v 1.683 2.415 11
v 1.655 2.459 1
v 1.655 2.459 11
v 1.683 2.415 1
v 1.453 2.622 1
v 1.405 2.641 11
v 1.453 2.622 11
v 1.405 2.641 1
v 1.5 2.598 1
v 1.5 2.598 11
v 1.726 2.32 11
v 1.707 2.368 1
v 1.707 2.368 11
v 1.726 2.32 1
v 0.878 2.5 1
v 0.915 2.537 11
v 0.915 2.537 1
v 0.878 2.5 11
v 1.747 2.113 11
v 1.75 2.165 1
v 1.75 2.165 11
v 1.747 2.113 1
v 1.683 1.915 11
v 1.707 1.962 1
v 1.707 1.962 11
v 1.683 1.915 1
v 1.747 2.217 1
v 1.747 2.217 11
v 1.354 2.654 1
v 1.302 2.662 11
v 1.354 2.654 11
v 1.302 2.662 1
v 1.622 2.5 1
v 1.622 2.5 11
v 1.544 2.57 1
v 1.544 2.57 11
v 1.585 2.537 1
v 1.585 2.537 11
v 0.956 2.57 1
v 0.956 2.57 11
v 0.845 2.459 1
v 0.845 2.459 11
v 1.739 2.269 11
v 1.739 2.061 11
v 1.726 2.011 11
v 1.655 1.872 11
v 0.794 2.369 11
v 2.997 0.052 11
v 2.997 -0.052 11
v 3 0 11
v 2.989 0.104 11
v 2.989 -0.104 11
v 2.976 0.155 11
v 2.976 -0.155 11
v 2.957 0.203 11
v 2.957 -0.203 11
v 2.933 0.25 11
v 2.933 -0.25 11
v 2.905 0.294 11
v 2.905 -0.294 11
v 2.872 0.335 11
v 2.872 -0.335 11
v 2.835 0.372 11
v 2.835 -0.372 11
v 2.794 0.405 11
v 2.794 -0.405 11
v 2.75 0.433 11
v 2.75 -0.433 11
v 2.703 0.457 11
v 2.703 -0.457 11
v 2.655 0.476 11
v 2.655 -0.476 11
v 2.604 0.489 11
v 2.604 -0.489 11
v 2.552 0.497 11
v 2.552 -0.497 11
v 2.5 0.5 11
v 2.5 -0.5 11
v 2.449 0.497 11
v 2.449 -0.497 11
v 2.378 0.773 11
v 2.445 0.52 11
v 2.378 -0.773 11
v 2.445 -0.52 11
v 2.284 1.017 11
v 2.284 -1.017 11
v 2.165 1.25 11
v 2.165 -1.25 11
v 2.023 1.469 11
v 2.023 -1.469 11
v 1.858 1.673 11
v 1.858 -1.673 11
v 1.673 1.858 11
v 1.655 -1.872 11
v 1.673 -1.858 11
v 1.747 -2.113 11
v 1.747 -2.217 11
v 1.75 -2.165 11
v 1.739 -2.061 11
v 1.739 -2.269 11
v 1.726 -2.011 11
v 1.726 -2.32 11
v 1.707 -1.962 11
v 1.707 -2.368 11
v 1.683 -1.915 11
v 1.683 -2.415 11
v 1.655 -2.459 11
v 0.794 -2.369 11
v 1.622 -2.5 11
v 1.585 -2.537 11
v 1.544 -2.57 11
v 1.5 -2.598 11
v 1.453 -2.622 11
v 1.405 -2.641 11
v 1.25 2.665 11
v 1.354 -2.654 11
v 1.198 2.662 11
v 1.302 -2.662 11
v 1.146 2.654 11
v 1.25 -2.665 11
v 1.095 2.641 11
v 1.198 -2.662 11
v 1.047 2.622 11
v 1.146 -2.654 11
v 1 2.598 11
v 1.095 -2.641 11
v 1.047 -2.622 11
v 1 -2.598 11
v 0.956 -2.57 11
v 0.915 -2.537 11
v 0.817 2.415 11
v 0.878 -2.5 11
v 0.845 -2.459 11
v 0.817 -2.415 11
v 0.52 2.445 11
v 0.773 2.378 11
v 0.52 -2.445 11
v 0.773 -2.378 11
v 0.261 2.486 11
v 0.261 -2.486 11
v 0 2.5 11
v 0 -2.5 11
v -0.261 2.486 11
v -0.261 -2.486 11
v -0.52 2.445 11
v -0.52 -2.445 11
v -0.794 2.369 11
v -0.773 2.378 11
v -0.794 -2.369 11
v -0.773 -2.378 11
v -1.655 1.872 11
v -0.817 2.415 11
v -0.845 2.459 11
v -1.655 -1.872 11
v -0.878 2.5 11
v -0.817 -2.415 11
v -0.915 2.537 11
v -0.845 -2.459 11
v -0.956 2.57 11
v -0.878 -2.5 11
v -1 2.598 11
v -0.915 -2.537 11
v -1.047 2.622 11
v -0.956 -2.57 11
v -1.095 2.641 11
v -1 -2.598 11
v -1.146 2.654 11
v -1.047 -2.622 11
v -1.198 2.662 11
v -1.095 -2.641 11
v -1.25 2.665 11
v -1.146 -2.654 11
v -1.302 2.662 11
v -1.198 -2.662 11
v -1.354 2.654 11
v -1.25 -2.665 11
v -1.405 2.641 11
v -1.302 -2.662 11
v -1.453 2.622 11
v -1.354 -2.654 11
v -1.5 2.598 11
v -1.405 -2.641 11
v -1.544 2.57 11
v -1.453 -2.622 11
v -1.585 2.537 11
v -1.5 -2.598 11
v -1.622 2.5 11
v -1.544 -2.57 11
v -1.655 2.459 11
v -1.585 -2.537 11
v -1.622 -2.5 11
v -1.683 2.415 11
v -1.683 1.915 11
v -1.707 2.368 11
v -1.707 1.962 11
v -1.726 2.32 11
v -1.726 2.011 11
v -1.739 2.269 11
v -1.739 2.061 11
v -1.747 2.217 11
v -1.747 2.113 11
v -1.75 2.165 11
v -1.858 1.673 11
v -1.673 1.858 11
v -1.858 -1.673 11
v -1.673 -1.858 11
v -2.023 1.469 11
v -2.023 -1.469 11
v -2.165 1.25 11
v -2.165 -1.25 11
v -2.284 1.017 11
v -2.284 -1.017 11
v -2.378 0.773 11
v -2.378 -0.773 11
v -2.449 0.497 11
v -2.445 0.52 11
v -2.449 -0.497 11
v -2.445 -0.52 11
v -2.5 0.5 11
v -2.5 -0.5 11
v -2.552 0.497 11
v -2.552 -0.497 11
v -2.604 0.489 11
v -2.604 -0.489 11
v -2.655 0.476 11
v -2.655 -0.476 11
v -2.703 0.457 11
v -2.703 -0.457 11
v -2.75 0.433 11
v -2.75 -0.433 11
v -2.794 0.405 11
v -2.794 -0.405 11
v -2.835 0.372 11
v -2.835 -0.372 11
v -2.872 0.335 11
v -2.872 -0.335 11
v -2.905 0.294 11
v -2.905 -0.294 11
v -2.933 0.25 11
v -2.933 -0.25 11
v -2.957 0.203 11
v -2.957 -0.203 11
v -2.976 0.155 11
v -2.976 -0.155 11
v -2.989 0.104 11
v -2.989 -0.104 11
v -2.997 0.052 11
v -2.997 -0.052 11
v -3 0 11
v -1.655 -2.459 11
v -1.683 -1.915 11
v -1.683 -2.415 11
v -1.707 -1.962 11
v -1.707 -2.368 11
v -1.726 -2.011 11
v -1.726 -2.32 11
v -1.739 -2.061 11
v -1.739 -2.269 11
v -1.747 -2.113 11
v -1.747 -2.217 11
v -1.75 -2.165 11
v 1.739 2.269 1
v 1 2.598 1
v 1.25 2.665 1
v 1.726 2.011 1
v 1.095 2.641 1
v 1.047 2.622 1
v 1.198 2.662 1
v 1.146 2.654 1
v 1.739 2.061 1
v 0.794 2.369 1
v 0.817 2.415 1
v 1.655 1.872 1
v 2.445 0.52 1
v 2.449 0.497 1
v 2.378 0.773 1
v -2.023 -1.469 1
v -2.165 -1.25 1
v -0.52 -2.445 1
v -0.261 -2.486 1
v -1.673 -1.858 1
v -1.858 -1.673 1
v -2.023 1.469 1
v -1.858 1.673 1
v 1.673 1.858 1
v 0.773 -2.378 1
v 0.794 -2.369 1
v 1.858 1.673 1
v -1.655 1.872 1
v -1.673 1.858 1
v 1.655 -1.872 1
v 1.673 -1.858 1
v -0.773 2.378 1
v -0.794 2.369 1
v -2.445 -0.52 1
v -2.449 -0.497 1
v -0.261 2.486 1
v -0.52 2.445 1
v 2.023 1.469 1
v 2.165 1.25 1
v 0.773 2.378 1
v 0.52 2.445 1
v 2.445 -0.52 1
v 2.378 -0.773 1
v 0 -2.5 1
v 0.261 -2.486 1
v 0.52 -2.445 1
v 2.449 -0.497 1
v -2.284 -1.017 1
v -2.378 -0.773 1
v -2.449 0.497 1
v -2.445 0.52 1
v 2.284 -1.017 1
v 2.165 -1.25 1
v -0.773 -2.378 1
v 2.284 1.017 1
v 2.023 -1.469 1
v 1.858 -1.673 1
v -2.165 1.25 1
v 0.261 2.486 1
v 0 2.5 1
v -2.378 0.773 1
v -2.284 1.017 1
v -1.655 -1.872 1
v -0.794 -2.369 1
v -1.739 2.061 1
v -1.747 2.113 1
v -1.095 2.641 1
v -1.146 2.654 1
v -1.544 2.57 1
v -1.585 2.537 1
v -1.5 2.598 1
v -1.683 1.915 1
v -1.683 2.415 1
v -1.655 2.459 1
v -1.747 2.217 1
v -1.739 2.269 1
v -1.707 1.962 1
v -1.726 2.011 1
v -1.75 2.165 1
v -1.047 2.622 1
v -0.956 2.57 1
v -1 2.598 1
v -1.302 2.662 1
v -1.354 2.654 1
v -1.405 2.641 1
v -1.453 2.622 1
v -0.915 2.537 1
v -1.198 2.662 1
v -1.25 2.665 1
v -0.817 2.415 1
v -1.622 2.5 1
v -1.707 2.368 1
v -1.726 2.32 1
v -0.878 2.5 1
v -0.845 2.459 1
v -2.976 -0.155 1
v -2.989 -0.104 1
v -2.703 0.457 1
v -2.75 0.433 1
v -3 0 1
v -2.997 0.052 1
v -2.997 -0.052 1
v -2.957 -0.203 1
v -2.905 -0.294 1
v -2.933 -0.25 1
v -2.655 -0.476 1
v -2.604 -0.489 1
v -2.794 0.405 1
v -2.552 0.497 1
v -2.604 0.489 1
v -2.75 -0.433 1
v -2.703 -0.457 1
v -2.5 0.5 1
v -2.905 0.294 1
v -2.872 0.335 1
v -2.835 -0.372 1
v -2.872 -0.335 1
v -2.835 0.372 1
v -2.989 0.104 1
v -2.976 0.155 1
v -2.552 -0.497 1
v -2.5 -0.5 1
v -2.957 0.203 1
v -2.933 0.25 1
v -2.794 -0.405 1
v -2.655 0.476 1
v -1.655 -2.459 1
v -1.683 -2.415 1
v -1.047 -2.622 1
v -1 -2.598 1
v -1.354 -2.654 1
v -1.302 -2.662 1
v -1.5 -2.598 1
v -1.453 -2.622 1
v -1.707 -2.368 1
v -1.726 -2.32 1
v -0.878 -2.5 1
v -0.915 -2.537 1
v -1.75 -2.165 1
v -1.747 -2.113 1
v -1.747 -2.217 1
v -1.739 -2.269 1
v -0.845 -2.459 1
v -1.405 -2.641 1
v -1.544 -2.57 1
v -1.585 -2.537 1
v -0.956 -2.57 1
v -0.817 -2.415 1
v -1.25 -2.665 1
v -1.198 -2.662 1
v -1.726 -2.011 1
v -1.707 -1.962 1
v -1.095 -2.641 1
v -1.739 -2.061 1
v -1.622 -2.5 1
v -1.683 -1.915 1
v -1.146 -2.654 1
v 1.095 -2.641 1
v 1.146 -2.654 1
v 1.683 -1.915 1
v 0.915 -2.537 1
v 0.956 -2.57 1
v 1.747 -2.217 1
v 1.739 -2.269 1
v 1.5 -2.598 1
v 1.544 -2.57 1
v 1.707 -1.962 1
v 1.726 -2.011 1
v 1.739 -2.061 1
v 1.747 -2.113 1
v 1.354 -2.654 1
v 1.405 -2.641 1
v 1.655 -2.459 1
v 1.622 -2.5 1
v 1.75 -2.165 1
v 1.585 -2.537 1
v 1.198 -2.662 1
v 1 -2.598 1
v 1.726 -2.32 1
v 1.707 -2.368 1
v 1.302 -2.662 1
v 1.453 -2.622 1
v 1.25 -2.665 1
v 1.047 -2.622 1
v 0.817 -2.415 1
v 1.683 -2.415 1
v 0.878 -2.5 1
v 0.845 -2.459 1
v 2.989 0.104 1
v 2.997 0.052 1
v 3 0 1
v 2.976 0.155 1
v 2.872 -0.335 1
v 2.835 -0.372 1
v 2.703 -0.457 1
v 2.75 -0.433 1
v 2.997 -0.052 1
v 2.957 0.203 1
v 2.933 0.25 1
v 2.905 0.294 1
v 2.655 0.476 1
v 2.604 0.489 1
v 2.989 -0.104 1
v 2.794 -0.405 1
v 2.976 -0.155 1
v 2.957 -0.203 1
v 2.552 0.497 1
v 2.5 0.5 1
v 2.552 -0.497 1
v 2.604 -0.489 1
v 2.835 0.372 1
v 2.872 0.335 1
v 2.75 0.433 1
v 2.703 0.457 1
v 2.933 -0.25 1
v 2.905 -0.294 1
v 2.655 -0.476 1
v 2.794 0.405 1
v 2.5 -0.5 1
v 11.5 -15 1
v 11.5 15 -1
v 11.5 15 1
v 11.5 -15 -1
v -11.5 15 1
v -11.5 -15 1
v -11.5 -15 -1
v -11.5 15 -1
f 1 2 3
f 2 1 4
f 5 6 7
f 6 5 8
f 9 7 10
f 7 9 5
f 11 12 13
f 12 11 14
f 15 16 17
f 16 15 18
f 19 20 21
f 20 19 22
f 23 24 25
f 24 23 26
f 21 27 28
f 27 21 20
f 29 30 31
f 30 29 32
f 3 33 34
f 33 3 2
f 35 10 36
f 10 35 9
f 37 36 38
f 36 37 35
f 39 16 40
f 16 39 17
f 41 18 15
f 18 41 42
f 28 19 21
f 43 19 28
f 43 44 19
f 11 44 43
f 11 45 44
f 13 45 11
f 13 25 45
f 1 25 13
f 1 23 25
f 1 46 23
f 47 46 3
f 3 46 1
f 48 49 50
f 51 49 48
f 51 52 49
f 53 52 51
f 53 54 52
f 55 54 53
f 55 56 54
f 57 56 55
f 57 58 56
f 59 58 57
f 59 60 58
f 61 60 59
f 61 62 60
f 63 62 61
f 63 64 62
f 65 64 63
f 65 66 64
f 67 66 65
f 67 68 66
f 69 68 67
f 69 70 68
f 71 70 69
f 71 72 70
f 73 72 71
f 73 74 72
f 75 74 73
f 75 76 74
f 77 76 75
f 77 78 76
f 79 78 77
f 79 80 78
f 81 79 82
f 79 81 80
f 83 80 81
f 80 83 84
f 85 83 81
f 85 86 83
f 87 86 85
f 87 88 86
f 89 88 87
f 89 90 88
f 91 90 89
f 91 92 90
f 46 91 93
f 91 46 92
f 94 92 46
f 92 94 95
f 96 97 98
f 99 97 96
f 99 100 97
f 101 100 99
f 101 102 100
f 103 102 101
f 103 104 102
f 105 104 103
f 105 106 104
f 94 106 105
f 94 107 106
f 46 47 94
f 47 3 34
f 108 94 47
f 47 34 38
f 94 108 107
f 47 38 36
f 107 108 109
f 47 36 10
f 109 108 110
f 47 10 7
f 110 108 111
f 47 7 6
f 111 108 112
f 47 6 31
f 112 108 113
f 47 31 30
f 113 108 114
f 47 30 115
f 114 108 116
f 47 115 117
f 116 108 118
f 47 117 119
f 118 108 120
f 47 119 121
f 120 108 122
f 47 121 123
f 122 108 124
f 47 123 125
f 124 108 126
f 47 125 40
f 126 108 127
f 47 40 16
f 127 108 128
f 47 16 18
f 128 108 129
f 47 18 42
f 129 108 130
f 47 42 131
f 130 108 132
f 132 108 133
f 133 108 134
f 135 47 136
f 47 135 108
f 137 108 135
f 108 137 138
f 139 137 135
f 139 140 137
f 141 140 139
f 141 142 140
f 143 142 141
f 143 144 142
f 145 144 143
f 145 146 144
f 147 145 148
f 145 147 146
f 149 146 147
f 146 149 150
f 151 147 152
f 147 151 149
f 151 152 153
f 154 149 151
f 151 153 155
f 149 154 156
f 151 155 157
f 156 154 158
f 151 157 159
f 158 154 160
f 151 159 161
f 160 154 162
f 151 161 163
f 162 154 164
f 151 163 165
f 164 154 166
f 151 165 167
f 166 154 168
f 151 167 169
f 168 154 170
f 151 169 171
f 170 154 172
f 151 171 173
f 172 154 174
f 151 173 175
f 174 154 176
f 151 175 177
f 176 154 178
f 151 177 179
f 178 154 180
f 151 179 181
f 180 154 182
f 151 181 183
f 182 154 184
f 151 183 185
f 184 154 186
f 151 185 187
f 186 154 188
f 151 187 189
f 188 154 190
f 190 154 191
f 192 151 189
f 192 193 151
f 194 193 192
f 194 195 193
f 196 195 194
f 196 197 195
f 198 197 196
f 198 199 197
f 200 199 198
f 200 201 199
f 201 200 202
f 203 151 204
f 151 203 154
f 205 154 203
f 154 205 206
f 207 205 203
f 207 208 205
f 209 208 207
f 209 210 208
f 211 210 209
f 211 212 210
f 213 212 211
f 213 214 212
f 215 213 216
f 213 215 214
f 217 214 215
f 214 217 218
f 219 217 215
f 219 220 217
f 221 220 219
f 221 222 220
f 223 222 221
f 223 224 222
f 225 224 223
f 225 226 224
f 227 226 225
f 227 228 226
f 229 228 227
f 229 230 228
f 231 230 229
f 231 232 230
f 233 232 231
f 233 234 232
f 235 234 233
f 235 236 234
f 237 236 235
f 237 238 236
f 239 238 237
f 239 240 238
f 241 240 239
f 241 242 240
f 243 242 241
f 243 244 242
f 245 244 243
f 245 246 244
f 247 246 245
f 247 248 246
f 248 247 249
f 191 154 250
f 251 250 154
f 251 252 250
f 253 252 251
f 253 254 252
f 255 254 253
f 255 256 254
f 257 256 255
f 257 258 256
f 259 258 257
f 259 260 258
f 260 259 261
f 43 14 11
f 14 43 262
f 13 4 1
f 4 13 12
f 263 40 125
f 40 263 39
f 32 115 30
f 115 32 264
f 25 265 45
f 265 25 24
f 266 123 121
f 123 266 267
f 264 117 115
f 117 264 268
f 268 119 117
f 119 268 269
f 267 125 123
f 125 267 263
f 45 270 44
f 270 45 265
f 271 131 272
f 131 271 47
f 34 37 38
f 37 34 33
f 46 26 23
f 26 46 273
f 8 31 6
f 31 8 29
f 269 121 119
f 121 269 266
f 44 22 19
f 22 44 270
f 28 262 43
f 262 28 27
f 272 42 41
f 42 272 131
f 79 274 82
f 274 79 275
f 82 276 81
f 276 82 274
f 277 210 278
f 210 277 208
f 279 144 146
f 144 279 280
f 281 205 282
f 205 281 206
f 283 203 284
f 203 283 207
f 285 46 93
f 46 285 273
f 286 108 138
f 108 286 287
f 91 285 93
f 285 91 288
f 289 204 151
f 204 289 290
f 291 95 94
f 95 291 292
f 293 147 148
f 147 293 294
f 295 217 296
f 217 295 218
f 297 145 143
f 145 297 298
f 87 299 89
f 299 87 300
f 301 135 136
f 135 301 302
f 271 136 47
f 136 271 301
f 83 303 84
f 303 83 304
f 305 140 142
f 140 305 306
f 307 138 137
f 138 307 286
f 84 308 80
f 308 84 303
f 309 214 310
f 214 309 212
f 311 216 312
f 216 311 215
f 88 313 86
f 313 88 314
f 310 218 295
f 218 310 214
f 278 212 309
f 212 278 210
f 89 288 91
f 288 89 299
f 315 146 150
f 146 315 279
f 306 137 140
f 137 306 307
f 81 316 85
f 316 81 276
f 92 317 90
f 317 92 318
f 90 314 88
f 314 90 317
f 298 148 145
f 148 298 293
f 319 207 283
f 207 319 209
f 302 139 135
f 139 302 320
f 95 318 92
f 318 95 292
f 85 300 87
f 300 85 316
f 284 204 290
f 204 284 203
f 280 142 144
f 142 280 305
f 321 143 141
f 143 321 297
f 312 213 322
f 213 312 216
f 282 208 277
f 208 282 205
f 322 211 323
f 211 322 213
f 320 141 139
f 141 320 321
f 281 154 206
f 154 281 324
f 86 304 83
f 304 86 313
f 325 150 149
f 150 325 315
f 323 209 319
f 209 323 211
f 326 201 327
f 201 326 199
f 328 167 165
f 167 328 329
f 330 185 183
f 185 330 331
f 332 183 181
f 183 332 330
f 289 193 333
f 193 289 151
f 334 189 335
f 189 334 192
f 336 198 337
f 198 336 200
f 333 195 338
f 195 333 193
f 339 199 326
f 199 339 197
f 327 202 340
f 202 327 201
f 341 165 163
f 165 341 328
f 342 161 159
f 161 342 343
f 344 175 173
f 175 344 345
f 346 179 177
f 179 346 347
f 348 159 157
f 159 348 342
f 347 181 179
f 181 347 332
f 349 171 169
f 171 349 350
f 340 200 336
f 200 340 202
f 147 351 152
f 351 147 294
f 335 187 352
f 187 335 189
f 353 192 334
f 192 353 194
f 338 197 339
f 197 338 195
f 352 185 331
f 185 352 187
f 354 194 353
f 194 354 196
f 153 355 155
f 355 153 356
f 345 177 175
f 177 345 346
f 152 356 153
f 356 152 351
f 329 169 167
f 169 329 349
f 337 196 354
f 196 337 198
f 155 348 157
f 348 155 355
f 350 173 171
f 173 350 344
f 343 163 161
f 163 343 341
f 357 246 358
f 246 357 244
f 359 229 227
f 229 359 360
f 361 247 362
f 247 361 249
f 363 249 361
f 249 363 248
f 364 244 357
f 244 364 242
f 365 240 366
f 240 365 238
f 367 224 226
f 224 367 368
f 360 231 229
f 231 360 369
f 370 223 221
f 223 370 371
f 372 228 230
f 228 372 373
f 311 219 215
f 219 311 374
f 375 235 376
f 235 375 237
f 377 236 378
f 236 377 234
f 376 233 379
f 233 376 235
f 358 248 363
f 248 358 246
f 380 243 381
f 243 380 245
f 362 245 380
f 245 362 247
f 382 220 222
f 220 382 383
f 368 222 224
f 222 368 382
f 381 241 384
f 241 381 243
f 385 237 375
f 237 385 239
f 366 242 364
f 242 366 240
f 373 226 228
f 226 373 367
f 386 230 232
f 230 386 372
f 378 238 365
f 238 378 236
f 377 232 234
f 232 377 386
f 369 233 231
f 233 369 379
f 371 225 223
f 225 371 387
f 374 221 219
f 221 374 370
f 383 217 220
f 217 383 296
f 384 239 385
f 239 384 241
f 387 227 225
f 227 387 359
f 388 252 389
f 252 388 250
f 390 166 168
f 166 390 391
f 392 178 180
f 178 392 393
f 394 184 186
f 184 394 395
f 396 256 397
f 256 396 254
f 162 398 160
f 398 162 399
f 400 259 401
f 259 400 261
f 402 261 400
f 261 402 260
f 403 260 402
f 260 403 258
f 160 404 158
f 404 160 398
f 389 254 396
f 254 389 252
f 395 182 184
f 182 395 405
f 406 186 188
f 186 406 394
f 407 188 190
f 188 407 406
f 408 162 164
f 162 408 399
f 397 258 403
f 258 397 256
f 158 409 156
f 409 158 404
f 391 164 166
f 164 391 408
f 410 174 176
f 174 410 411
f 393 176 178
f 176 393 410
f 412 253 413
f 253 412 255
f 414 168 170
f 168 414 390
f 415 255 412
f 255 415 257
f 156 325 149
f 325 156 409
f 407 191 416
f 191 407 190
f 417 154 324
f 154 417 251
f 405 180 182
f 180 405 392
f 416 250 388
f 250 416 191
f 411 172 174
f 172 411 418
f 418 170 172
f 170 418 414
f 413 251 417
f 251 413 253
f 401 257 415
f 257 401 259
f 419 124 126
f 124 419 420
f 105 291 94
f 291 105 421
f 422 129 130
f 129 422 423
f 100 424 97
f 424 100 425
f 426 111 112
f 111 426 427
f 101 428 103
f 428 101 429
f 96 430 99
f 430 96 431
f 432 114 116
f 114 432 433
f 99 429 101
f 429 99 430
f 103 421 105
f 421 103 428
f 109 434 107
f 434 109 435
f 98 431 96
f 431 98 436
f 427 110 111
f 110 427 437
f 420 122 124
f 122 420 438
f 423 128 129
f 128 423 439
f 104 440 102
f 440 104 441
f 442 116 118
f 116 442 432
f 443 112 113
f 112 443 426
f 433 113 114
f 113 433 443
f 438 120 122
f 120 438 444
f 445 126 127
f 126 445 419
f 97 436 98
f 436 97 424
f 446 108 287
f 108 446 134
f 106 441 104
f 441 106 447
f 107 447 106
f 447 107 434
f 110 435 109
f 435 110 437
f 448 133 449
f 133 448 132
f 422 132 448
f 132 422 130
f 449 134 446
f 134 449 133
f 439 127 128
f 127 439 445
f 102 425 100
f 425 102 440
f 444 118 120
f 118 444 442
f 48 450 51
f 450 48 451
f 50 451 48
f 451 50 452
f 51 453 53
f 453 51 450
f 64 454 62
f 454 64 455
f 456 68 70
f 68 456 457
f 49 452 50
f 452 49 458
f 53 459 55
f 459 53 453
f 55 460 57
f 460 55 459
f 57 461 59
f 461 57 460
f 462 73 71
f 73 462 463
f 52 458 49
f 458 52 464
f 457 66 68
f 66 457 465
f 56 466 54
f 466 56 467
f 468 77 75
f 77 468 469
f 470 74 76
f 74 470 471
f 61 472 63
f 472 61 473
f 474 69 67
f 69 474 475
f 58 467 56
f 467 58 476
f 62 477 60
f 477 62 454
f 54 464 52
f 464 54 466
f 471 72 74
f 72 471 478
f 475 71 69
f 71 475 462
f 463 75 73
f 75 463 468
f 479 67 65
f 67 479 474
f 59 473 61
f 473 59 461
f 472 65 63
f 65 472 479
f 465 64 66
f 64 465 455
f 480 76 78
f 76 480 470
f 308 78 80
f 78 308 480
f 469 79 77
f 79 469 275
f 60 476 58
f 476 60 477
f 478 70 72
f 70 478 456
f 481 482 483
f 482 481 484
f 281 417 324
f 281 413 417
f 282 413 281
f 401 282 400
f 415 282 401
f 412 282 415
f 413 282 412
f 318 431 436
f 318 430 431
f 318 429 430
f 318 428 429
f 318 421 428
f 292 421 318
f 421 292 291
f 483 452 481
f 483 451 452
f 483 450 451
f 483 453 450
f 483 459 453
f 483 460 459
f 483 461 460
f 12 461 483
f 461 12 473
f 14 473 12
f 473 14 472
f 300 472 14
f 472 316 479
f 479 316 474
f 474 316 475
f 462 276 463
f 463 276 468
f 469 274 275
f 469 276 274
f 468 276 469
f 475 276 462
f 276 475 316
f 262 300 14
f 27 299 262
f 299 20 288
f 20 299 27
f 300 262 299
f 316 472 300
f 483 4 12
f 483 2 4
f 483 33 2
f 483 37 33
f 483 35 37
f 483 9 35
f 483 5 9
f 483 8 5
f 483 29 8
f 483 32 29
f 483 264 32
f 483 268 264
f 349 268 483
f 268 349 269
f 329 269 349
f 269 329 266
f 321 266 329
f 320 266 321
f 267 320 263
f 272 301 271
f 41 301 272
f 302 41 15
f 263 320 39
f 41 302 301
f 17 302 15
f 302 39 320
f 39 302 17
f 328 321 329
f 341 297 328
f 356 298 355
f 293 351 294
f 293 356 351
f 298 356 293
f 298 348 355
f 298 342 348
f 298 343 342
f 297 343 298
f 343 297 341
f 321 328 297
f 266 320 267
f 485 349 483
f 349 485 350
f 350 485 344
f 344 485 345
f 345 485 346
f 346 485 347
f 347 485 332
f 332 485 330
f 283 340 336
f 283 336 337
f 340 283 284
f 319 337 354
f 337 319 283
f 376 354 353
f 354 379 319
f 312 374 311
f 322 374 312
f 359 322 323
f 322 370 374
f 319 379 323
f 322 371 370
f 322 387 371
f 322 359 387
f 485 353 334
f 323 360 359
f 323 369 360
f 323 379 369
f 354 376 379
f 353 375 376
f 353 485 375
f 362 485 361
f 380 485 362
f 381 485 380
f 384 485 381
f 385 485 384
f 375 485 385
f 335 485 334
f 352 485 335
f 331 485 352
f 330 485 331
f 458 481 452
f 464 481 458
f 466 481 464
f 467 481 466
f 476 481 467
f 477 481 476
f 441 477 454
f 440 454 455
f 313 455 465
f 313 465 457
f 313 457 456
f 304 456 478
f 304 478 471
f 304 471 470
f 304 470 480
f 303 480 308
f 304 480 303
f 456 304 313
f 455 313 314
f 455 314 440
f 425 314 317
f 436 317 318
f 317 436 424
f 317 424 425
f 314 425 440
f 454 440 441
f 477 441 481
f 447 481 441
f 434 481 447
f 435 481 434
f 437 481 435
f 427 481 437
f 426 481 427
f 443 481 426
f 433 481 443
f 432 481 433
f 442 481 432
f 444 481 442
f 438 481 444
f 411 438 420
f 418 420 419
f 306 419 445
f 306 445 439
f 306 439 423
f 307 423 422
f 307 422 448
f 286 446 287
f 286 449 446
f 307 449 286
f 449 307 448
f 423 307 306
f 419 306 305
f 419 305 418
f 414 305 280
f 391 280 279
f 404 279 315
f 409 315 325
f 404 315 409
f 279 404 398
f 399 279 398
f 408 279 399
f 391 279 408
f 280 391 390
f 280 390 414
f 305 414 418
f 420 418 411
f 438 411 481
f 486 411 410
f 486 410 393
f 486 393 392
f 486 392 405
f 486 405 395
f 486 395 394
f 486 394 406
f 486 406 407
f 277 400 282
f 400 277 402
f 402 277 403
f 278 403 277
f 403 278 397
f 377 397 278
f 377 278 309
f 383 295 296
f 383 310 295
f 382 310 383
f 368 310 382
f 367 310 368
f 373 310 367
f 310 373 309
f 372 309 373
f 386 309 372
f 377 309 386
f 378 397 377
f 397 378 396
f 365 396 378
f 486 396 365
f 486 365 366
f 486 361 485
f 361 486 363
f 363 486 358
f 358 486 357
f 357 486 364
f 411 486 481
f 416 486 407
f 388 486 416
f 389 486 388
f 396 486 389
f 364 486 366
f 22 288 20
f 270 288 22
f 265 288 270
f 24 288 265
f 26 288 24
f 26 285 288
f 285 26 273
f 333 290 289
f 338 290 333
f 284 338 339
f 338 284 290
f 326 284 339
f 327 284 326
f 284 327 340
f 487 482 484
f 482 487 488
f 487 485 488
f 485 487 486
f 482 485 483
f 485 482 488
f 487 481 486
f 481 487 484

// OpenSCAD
$fn = 60;
module chytadlo(){
	for(n=[1:6]){
		rotate(a=n*360/6, v = [0,0,1] ) translate([2.5,0,0]) 			cylinder(r=0.5,11);
		cylinder(r=2.5, 11);
	}
}
chytadlo();
#cube([23,30,2], center=true);
